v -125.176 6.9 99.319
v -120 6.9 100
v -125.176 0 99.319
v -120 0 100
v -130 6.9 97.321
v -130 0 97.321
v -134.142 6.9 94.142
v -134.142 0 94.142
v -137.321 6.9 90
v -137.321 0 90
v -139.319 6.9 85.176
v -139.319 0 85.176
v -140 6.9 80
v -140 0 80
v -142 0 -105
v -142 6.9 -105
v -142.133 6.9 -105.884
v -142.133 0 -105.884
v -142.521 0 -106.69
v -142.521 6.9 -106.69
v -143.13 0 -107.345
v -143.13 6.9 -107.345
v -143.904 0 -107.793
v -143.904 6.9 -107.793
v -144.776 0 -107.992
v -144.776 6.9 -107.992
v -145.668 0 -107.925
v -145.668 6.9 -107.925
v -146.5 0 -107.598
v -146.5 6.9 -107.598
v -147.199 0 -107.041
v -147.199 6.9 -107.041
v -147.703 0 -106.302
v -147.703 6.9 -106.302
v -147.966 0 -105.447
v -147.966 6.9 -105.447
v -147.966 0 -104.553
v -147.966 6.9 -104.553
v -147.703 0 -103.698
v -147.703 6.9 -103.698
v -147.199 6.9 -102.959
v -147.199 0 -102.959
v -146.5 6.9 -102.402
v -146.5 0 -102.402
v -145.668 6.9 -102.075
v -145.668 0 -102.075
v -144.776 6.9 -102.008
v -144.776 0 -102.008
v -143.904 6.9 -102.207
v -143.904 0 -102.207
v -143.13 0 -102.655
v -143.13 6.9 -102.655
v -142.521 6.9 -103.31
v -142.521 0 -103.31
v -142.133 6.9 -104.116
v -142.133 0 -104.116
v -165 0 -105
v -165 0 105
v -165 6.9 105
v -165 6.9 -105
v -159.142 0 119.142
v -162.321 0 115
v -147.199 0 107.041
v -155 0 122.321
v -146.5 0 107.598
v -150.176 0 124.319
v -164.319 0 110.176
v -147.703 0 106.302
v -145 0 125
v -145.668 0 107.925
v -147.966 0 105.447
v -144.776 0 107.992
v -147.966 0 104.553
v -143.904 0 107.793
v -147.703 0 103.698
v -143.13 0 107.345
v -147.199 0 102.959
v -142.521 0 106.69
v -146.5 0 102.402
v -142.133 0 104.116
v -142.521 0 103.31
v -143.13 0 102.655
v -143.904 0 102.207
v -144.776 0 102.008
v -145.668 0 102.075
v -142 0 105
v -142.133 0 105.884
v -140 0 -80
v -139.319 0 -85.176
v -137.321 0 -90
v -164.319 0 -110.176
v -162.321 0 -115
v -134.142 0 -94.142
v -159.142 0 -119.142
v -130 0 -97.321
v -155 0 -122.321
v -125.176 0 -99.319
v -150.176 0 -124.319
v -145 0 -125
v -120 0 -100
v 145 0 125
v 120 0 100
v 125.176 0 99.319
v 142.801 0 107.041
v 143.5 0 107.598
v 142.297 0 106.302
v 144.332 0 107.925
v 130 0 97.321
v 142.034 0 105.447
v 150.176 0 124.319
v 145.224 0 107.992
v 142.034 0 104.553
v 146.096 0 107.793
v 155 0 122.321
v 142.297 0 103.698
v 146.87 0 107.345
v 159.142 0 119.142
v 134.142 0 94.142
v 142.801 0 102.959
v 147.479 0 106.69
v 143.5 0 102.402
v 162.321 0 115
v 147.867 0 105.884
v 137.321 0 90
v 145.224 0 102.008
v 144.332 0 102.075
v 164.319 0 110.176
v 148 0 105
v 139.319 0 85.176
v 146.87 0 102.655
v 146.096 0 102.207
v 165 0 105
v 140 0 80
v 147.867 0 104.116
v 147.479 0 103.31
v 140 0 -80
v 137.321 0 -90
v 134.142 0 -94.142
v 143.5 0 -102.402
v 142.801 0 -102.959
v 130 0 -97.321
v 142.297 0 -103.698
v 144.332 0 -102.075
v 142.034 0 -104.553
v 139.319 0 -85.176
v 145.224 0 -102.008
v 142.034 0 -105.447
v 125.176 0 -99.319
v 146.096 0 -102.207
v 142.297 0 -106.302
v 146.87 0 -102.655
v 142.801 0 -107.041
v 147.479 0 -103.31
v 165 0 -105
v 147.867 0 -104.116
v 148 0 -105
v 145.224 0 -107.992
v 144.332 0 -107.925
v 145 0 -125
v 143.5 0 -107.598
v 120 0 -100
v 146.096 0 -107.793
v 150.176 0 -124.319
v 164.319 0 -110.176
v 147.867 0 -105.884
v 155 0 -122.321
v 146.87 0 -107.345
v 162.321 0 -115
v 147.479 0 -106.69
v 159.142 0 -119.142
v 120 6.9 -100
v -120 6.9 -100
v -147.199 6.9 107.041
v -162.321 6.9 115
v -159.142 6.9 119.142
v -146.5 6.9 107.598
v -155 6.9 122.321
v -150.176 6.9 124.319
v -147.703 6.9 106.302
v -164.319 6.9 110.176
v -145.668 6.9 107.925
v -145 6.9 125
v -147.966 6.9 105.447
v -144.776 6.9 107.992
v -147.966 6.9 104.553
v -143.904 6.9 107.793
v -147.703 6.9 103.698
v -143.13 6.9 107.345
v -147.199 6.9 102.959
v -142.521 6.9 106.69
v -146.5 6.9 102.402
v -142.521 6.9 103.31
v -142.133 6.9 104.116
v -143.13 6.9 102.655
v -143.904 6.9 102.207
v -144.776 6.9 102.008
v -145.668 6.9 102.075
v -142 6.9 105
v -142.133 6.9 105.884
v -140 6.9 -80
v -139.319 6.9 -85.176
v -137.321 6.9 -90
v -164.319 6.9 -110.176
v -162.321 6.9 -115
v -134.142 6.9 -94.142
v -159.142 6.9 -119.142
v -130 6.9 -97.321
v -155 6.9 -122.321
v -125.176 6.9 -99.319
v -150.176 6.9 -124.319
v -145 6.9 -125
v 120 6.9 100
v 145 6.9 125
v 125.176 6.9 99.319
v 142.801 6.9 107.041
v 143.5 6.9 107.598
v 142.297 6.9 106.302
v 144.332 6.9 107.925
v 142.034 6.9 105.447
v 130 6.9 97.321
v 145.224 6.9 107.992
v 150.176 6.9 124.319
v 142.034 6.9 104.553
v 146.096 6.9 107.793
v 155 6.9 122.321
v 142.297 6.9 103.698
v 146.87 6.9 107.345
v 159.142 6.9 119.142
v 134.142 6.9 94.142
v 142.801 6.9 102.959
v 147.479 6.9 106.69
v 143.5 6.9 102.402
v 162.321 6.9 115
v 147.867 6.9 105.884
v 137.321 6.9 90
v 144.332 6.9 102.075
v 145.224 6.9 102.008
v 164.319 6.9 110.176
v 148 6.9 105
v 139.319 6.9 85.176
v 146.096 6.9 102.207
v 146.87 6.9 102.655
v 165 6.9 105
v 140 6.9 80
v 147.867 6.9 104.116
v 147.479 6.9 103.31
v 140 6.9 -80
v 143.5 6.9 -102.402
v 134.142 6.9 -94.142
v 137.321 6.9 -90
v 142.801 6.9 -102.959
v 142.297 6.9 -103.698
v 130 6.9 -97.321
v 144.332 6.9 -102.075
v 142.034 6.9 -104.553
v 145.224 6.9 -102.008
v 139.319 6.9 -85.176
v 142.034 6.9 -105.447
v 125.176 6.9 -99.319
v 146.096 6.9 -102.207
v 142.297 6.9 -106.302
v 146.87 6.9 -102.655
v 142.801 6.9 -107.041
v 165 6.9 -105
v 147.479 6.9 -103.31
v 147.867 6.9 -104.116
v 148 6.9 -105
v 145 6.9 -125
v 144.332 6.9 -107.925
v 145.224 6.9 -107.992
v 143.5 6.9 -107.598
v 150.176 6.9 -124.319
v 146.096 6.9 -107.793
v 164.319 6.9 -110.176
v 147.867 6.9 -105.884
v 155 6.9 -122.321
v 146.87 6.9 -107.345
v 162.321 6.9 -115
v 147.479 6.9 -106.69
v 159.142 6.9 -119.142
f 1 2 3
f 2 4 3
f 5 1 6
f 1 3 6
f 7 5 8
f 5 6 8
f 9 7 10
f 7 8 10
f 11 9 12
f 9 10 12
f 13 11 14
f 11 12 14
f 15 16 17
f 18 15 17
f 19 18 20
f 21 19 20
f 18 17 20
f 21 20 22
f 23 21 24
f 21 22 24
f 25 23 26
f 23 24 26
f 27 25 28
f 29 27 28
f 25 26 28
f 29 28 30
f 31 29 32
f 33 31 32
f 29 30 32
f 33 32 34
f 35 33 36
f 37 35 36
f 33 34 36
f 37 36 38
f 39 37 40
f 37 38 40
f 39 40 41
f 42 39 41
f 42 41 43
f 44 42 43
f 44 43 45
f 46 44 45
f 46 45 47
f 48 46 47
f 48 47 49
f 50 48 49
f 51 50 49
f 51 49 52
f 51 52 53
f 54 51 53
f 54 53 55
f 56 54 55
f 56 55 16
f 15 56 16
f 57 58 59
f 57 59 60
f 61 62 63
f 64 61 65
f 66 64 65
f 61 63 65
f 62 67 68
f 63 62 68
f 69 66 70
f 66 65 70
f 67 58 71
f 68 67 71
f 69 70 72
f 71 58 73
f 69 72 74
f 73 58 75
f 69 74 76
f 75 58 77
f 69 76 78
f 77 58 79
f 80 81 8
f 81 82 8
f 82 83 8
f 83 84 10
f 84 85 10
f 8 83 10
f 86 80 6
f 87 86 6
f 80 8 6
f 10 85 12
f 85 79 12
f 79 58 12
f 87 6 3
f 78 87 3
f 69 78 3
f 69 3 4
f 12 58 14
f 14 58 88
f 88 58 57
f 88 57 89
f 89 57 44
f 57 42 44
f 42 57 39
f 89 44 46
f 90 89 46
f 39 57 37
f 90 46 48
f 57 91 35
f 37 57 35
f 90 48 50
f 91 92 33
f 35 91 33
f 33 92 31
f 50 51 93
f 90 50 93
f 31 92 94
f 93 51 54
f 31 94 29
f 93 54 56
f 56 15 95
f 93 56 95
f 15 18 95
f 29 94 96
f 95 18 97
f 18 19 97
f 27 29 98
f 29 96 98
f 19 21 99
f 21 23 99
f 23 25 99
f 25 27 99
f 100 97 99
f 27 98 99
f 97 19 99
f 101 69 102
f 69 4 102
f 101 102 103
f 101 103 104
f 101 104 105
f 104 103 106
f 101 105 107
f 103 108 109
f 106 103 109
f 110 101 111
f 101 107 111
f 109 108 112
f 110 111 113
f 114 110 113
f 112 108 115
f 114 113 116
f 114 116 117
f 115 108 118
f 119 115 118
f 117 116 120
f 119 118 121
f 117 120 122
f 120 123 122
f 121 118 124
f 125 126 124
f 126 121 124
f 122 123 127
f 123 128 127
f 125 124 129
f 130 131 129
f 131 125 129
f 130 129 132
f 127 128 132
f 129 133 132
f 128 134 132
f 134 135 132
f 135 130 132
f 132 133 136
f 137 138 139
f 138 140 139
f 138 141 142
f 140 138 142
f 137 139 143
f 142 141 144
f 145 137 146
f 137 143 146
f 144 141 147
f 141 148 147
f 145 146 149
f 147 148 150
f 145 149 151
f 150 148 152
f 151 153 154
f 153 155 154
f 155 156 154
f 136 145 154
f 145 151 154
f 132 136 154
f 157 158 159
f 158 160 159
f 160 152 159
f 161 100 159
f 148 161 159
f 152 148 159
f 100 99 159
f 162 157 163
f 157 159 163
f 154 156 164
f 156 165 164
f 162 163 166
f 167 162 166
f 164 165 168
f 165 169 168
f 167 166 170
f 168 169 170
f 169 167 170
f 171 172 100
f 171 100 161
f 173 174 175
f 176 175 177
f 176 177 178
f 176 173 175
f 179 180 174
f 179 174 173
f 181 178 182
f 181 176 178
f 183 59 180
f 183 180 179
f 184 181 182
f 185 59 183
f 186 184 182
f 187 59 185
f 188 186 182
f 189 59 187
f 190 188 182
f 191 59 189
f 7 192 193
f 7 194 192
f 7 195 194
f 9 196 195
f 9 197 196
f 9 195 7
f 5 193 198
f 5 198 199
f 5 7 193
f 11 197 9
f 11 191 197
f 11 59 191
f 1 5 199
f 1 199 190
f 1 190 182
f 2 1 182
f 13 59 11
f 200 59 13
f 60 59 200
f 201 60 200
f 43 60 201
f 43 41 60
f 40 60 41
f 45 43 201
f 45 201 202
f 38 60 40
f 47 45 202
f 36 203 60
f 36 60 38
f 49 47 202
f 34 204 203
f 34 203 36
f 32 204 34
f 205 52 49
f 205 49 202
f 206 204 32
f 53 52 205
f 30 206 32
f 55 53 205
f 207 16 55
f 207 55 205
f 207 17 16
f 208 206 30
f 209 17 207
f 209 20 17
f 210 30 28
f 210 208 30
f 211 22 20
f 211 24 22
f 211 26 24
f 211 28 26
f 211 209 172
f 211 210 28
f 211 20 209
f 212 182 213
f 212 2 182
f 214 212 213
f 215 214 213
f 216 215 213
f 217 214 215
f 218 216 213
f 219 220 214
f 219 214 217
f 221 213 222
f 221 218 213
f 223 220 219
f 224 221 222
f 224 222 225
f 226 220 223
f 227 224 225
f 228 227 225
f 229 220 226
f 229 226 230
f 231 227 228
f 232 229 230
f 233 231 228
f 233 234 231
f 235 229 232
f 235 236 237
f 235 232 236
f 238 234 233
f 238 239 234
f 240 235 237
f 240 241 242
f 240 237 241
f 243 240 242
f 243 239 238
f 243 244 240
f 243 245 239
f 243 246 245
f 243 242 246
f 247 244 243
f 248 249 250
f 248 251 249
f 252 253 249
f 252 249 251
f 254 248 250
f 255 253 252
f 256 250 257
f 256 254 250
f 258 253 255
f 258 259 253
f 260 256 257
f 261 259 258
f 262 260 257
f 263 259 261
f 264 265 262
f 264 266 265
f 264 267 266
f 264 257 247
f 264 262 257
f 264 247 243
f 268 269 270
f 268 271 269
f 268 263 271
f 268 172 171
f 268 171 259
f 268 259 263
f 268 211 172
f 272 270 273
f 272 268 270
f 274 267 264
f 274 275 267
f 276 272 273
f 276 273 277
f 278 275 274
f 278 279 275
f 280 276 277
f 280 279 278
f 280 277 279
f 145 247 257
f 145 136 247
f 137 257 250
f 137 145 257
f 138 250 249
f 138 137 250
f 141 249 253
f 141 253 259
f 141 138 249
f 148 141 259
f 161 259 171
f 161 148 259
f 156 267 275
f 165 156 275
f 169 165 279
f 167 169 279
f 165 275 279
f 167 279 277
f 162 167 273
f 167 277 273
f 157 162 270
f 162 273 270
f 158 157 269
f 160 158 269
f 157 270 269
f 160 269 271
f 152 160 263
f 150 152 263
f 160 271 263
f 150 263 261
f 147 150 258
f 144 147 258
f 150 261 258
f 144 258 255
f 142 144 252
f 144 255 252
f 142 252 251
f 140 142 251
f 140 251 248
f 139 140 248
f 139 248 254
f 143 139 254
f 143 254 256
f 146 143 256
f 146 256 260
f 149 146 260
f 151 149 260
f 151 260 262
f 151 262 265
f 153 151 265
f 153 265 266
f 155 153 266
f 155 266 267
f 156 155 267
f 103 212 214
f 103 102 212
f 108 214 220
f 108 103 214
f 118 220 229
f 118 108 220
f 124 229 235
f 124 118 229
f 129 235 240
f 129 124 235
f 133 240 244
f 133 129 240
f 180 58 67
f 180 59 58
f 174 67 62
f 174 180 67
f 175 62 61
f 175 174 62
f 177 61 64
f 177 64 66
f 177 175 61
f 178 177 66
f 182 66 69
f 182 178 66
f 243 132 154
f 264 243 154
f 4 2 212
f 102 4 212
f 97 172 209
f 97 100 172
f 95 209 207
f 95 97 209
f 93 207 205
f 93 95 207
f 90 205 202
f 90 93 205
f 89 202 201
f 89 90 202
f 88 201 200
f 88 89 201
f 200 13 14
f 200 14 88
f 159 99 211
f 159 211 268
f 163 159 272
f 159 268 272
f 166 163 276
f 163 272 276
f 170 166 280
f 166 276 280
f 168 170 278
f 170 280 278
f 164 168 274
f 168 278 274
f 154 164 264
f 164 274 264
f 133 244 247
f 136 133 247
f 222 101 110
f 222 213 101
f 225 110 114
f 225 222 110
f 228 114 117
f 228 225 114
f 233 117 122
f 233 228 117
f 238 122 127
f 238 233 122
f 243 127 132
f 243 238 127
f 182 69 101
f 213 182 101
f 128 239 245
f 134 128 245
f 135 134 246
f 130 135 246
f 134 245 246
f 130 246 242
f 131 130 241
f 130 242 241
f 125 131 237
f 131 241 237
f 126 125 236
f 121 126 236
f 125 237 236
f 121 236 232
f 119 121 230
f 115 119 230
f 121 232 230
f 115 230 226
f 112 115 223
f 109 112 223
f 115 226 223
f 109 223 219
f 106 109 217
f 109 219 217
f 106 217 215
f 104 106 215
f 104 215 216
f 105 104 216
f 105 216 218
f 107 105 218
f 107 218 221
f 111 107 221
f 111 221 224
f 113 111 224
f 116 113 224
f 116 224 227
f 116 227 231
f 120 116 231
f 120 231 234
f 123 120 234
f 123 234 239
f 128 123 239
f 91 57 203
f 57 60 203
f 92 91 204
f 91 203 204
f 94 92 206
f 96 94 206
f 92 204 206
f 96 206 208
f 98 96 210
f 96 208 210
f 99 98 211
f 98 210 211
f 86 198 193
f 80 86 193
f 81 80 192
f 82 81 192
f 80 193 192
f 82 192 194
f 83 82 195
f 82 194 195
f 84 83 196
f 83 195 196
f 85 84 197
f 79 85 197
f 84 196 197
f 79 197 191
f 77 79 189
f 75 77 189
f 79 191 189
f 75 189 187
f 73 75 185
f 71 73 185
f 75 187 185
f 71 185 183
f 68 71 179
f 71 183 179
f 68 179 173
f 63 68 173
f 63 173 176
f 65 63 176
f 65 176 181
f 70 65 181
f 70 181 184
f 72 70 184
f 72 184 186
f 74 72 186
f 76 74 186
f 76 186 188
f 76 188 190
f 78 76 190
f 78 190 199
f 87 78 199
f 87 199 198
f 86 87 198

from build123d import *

# Parameters (mm, degrees)
SKETCH1_W           = 330
SKETCH1_H           = 250
BOSS_EXTRUDE1_DEPTH = 6.9
SKETCH2_R           = 3
CUT_EXTRUDE1_DEPTH  = 7.9
SKETCH3_W           = 280
SKETCH3_H           = 200
CUT_EXTRUDE2_DEPTH  = 7.9
FILLET1_R           = 20
FILLET2_R           = 20


with BuildPart() as part:
    # Sketch1 → Boss-Extrude1 (new body)
    with BuildSketch(Plane(origin=(0, 0, 0), x_dir=(1, 0, 0), z_dir=(0, 1, 0))):
        Rectangle(SKETCH1_W, SKETCH1_H)
    extrude(amount=BOSS_EXTRUDE1_DEPTH)

    # Sketch2 → Cut-Extrude1 (cut, through all)
    with BuildSketch(Plane(origin=(0, 6.9, 0), x_dir=(1, 0, 0), z_dir=(0, 1, 0))):
        with Locations((-145, 105)):
            Circle(SKETCH2_R)
        with Locations((145, 105)):
            Circle(SKETCH2_R)
        with Locations((145, -105)):
            Circle(SKETCH2_R)
        with Locations((-145, -105)):
            Circle(SKETCH2_R)
    extrude(amount=-CUT_EXTRUDE1_DEPTH, mode=Mode.SUBTRACT)

    # Sketch3 → Cut-Extrude2 (cut, through all)
    with BuildSketch(Plane(origin=(0, 6.9, 0), x_dir=(1, 0, 0), z_dir=(0, 1, 0))):
        Rectangle(SKETCH3_W, SKETCH3_H)
    extrude(amount=-CUT_EXTRUDE2_DEPTH, mode=Mode.SUBTRACT)

    # Fillet1
    fillet1_edges = [part.edges().sort_by_distance(p)[0] for p in [
        (-165, 3.45, -125),
        (165, 3.45, -125),
        (165, 3.45, 125),
        (-165, 3.45, 125),
    ]]
    fillet(fillet1_edges, radius=FILLET1_R)

    # Fillet2
    fillet2_edges = [part.edges().sort_by_distance(p)[0] for p in [
        (-140, 3.45, 100),
        (-140, 3.45, -100),
        (140, 3.45, -100),
        (140, 3.45, 100),
    ]]
    fillet(fillet2_edges, radius=FILLET2_R)


solid = part.part
